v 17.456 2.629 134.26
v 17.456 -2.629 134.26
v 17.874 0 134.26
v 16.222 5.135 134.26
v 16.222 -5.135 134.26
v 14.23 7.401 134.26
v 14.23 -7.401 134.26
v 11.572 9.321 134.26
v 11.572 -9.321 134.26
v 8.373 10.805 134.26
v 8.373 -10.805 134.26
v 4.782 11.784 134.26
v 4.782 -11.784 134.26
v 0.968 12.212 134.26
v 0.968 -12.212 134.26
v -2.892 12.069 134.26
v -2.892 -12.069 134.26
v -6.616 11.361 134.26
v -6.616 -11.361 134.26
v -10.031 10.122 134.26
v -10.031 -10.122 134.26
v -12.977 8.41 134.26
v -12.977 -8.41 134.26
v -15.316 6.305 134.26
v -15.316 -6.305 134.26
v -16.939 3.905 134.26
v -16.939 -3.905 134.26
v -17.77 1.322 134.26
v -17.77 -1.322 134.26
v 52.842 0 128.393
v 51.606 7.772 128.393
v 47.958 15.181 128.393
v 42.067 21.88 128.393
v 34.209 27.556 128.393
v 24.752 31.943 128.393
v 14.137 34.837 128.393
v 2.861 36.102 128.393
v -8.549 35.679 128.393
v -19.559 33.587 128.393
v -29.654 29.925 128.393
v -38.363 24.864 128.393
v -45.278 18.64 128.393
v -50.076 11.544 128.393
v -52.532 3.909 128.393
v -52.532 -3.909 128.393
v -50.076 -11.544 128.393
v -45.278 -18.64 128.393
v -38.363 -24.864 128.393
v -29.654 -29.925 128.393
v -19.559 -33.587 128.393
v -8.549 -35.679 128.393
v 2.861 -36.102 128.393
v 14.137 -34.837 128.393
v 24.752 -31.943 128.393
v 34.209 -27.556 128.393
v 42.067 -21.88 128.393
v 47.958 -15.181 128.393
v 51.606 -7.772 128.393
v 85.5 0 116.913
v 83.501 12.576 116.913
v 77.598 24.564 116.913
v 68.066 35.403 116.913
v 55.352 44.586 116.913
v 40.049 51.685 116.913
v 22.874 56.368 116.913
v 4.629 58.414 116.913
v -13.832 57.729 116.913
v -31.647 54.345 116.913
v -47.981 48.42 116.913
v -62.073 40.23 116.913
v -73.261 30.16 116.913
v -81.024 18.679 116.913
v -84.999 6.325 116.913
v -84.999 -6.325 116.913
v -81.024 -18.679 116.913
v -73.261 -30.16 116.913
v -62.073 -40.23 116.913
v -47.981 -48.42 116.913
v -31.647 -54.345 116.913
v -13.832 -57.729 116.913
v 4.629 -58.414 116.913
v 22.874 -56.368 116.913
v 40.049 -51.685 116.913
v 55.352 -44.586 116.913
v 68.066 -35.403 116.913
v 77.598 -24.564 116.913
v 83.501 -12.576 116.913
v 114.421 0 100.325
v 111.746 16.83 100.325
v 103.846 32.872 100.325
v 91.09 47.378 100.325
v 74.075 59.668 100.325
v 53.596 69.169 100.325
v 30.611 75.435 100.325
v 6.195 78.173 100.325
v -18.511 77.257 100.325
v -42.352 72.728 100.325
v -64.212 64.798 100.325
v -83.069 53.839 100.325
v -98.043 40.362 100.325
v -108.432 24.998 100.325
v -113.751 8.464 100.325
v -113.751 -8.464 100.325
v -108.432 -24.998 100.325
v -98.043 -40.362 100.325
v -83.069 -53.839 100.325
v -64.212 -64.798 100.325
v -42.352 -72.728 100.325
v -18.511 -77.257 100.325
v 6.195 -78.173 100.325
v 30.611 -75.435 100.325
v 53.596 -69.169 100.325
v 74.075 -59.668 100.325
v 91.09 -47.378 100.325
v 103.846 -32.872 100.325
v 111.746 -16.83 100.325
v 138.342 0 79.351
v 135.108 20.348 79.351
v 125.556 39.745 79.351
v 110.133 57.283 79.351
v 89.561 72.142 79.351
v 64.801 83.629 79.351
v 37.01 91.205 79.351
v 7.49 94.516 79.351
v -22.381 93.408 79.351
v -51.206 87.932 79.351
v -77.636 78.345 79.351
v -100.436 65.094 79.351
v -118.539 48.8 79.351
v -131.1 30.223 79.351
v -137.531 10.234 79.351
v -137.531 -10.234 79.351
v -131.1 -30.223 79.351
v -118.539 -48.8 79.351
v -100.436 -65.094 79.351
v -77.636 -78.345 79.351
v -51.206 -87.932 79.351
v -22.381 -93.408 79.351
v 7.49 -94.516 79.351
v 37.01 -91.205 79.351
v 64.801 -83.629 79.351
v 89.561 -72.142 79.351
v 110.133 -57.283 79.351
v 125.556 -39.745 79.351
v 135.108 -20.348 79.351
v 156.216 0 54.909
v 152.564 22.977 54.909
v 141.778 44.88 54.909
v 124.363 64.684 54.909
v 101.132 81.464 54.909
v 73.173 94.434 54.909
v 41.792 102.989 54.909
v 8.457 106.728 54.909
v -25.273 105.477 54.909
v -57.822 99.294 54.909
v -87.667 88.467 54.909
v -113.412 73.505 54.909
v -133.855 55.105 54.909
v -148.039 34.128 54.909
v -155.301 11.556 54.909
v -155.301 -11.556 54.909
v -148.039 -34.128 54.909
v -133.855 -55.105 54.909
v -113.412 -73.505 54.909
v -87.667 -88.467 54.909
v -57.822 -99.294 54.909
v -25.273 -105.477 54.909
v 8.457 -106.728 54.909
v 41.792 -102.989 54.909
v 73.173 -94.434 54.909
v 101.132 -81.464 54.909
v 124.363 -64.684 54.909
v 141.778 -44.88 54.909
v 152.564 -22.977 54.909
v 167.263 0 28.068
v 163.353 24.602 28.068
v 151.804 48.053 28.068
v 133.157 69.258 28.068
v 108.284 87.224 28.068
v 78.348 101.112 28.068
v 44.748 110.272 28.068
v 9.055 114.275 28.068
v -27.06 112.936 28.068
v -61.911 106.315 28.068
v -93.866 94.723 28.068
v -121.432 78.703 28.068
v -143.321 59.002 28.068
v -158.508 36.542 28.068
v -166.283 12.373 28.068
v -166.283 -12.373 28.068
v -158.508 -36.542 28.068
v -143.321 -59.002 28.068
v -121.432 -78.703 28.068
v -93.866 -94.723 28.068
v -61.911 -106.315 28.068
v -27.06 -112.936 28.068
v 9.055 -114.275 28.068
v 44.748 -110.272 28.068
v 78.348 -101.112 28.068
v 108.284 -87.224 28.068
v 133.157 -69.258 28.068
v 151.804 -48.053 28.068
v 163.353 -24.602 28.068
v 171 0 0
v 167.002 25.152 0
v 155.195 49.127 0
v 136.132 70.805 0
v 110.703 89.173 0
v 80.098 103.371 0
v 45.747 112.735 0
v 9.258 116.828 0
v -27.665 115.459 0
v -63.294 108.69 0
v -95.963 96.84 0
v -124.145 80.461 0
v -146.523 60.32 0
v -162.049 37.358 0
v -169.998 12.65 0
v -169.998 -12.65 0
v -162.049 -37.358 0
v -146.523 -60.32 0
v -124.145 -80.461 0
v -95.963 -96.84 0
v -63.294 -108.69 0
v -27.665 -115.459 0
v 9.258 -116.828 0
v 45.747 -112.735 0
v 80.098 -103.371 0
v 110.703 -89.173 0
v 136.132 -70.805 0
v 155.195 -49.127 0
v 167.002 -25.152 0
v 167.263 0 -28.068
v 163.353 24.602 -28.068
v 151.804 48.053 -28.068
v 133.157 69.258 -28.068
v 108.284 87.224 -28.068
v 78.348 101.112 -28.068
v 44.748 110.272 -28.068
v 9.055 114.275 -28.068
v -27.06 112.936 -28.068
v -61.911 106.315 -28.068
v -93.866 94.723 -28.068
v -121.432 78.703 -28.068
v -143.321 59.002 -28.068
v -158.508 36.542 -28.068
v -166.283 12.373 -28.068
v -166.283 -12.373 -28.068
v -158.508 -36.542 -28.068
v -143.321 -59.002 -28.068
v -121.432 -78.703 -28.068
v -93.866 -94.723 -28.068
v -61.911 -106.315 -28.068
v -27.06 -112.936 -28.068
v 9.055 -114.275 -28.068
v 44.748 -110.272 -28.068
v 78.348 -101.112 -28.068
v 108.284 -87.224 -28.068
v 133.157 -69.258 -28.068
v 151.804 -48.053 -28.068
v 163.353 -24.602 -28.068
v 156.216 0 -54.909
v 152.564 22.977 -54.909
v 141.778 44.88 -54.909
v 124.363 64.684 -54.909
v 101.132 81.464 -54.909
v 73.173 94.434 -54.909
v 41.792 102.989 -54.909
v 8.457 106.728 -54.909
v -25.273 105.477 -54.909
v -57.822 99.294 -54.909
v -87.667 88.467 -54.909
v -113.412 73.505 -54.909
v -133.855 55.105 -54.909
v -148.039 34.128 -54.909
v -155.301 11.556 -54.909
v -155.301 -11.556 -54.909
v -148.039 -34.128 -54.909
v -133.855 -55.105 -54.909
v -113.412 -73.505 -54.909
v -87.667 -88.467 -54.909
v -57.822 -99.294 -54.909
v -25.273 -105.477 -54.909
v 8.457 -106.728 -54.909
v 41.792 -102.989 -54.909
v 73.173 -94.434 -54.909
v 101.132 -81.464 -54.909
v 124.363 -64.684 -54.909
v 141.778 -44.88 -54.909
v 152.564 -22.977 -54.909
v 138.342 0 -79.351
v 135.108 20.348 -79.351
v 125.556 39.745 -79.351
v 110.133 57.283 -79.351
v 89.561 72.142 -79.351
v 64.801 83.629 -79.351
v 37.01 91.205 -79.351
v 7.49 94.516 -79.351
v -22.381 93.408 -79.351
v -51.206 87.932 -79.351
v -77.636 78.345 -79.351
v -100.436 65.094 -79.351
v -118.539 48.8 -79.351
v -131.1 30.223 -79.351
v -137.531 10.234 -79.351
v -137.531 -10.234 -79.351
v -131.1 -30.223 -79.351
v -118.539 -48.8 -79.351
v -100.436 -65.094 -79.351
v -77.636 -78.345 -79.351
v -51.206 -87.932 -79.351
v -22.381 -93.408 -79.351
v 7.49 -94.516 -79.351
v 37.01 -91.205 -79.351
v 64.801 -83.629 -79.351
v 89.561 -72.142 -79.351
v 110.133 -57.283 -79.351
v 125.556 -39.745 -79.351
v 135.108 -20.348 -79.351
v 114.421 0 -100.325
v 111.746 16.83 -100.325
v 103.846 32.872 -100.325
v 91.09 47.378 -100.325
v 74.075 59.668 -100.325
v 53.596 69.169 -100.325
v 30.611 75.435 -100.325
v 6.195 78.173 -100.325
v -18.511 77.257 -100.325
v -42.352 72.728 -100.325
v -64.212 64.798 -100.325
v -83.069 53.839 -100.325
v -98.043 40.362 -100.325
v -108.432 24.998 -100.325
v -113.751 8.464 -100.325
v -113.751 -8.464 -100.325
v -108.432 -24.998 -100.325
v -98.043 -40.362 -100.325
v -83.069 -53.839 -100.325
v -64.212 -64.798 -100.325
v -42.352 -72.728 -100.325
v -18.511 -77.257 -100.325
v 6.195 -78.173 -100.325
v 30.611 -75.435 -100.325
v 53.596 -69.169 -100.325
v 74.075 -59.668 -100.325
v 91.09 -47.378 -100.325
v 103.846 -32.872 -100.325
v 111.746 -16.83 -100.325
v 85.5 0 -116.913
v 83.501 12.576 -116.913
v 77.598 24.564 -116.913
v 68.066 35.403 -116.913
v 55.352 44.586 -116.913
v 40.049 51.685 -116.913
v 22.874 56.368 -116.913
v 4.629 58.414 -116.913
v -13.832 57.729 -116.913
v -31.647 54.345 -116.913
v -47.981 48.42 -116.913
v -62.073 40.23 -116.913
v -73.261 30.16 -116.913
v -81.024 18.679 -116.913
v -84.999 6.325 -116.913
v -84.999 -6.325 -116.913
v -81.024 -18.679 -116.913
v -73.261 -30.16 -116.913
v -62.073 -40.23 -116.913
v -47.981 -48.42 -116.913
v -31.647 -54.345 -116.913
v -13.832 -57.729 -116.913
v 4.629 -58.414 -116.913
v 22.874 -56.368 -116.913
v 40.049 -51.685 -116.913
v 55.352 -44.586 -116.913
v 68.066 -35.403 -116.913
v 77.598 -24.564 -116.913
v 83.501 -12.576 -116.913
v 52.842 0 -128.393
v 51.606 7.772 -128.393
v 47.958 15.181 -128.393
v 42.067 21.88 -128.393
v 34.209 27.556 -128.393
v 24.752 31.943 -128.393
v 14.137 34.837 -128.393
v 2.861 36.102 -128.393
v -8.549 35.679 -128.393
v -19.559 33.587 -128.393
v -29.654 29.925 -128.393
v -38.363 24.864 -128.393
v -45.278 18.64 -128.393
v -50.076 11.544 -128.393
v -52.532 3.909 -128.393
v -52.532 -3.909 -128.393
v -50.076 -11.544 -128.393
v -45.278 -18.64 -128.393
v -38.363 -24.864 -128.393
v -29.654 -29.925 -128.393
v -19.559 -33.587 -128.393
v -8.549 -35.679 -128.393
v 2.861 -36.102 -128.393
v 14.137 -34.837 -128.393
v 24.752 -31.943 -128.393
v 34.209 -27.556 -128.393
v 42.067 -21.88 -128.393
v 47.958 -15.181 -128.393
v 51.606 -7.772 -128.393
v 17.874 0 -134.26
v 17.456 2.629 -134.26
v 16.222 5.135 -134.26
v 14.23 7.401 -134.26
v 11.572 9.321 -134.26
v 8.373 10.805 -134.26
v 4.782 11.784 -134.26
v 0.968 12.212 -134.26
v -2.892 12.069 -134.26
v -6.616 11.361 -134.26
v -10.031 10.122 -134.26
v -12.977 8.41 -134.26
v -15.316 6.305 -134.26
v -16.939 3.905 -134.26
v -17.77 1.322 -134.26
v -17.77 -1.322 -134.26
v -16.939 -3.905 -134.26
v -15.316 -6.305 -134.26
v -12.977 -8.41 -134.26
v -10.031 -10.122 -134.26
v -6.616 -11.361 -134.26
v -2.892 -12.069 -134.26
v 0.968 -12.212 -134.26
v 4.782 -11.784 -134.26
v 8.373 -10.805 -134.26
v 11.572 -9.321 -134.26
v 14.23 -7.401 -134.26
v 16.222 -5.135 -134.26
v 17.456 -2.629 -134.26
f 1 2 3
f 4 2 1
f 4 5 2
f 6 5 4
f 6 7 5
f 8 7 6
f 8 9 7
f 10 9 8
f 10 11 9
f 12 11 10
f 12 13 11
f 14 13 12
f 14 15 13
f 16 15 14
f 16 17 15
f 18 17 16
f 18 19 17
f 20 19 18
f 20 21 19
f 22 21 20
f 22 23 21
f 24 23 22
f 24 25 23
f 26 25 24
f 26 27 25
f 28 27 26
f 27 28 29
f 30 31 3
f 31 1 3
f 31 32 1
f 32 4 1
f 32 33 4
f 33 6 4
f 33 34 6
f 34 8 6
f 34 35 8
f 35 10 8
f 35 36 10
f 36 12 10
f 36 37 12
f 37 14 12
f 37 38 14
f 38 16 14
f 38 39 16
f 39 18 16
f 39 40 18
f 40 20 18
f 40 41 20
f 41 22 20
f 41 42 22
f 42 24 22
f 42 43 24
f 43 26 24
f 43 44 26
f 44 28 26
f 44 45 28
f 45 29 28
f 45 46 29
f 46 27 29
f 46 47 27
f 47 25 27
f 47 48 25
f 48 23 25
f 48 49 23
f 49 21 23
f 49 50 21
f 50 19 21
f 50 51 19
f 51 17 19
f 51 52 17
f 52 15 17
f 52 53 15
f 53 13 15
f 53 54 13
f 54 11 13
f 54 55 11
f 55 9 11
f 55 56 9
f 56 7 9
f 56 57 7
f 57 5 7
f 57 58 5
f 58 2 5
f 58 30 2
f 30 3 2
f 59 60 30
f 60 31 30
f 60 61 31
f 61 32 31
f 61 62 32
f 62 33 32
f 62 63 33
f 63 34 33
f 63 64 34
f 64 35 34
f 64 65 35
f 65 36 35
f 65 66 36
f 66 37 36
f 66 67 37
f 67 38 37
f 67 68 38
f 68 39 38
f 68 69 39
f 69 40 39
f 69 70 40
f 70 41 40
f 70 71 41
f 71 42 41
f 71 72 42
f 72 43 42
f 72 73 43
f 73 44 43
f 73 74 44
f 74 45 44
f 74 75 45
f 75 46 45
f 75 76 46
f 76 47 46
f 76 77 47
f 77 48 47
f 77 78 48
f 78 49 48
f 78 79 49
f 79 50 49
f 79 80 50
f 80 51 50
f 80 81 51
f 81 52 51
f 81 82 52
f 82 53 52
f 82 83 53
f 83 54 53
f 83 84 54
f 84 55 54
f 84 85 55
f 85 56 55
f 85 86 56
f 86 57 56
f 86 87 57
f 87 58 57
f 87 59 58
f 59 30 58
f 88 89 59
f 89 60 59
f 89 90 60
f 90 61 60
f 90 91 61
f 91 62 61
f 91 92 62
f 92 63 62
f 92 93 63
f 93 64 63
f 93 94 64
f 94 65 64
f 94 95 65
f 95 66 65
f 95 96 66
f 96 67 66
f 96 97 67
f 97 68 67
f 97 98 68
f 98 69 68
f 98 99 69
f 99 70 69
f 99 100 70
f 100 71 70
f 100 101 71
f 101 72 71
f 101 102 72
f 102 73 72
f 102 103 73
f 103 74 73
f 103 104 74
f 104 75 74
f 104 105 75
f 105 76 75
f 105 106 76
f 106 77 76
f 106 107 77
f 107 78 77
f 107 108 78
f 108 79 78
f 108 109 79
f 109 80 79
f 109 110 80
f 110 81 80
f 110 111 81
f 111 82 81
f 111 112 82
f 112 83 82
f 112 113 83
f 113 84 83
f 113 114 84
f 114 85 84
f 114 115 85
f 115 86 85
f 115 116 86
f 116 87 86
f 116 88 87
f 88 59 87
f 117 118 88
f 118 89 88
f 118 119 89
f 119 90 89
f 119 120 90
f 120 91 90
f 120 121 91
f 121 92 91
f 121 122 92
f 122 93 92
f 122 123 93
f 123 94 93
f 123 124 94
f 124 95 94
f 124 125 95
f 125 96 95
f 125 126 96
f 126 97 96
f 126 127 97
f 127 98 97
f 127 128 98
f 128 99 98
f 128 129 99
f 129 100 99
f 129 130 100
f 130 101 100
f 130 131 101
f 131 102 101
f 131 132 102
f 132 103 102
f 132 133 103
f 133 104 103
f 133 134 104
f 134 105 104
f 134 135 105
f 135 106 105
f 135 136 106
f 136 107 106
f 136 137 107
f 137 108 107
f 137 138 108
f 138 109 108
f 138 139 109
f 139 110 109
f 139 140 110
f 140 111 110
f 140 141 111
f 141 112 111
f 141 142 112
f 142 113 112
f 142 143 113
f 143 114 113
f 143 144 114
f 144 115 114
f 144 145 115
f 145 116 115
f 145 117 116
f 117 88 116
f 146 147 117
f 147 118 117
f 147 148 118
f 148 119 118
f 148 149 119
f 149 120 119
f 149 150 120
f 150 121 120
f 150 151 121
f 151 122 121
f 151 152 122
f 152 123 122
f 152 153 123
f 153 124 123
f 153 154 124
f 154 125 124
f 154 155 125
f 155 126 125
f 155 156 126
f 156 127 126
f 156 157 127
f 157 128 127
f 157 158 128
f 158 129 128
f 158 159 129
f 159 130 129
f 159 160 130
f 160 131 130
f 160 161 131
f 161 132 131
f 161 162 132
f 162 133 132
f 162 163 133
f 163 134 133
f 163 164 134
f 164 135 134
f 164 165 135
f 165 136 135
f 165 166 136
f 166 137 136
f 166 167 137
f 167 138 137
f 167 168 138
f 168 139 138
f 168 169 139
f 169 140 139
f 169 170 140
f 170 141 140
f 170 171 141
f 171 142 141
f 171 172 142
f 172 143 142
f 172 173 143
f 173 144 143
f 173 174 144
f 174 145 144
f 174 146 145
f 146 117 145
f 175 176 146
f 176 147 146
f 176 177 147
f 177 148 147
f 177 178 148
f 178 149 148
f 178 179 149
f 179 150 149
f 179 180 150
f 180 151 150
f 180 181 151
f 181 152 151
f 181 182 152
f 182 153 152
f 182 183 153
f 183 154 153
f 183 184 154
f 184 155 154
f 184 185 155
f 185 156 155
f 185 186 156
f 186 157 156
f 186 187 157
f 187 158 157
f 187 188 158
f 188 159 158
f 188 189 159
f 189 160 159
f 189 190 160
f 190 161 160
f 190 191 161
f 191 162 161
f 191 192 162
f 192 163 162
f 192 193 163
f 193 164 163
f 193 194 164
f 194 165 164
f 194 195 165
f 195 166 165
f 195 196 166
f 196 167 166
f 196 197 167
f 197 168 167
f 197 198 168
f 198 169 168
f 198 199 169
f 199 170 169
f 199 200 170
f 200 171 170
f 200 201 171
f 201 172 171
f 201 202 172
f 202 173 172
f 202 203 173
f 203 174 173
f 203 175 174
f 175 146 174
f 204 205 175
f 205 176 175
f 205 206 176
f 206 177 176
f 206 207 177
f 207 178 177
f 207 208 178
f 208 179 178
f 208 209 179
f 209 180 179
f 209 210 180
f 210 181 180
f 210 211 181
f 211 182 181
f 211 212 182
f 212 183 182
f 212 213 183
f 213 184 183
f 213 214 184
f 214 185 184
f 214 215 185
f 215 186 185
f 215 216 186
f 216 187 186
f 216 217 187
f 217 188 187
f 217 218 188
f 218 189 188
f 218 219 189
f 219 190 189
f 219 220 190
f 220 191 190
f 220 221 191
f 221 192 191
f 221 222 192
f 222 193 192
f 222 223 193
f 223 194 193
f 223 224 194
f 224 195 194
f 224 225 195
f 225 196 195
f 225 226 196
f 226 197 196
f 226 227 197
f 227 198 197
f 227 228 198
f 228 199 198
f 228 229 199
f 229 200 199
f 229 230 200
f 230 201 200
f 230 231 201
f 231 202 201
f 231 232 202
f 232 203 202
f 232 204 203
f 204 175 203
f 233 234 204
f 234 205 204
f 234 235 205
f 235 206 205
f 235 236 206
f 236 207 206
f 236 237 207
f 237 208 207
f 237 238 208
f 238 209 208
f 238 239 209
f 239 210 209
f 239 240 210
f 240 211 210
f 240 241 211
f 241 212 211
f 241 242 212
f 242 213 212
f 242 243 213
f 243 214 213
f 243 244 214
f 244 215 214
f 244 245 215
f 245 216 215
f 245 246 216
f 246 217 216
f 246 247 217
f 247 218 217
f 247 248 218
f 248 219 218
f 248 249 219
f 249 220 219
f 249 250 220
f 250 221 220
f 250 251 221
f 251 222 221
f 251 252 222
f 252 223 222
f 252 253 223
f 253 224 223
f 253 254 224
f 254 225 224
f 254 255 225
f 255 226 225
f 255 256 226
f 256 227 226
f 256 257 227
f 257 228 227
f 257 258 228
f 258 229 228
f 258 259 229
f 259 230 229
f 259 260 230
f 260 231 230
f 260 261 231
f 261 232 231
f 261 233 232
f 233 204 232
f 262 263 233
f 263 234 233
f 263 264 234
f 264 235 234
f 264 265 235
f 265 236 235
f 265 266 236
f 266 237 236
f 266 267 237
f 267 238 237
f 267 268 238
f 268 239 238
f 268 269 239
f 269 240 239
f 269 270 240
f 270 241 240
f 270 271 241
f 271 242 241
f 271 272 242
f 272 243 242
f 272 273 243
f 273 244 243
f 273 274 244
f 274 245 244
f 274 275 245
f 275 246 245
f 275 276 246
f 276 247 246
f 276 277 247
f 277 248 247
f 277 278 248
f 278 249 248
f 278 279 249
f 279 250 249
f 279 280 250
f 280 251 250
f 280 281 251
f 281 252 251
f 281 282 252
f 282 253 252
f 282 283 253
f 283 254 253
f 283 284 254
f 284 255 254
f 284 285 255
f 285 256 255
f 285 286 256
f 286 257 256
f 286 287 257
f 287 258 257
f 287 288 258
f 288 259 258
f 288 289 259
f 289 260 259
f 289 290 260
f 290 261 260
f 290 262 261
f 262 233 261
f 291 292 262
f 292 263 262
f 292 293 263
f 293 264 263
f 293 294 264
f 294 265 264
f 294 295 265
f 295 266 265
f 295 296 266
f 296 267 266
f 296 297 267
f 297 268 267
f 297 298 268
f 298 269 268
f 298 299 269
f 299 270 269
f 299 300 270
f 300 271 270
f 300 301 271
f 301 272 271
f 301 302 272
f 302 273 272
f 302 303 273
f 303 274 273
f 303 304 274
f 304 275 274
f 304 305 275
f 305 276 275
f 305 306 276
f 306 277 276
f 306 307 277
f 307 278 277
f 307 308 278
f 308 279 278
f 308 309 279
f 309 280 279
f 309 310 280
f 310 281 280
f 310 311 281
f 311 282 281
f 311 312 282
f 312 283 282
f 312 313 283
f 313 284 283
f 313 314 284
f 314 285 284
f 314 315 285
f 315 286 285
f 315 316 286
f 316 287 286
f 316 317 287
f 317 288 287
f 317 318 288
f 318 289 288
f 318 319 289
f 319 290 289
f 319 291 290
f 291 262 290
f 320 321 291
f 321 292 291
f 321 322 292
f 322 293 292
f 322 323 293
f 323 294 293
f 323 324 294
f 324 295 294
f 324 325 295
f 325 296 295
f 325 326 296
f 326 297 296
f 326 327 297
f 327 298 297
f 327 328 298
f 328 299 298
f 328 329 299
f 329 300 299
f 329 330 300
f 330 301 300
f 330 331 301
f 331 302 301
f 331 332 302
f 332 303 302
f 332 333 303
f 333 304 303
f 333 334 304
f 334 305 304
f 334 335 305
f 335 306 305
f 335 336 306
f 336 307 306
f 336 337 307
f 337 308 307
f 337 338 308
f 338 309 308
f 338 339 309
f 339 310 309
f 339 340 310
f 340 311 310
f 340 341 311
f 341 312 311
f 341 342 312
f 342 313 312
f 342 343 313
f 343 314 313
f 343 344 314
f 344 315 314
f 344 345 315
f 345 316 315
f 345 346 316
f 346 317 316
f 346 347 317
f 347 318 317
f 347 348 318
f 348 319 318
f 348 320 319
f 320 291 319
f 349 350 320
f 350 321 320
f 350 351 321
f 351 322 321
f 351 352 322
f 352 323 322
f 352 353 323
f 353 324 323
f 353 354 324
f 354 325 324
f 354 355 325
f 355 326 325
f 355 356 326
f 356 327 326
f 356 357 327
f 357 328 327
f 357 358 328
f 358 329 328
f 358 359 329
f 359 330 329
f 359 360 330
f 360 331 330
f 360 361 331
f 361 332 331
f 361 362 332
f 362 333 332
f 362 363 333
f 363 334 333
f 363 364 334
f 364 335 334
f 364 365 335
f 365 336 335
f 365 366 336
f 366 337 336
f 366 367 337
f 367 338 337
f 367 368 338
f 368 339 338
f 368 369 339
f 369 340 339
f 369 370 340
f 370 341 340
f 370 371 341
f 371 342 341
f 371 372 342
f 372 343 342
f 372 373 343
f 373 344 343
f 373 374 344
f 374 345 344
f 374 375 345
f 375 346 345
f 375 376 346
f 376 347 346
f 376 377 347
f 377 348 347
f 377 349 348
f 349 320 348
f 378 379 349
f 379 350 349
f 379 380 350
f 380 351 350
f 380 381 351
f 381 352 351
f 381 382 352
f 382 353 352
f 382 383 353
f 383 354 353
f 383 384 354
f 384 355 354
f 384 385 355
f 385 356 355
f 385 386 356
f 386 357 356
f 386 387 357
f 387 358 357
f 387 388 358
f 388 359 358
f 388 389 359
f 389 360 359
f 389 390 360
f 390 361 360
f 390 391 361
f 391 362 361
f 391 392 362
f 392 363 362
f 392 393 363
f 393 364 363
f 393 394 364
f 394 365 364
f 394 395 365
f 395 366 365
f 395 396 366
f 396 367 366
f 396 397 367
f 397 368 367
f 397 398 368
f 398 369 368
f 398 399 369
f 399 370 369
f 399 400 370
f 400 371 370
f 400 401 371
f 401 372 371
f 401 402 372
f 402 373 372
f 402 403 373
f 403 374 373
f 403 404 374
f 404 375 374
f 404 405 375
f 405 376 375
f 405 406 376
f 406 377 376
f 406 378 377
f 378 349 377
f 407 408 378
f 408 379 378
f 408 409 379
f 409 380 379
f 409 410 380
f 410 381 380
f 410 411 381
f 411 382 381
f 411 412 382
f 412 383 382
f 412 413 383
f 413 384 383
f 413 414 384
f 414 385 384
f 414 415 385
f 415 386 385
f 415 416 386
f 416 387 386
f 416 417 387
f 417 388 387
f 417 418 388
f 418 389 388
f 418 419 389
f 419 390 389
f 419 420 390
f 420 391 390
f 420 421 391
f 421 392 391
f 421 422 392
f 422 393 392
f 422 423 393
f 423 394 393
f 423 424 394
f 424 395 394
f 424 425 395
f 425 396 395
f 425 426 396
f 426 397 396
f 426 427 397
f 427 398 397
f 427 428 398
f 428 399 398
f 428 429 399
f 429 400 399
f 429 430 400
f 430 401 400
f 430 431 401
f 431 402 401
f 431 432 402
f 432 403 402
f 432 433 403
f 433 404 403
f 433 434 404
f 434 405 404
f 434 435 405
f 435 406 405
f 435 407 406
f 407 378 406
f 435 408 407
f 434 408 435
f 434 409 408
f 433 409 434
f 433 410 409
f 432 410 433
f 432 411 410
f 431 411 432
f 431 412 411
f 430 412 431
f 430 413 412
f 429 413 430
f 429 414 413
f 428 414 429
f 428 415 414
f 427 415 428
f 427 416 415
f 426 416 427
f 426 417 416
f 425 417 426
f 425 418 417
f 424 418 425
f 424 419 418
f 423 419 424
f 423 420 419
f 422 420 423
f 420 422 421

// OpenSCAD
// Generated by SolidPython 1.0.1 on 2020-07-29 00:46:54


scale(v = [19, 13, 15]) {
	sphere(r = 9);
}
/***********************************************
*********      SolidPython code:      **********
************************************************
 
# import packages: SolidPython
from solid import *
from solid.utils import *
from itertools import chain, combinations, permutations


class Resize:

    def __init__(self, scad_file):
        self.scad_file = scad_file
        #self.scad_file = import_scad(scad_file)
        # cone/cylinder param:
        self.r1 = 0
        self.r2 = 0
        self.h = 0
        # rectangular prism param:
        self.w = 0
        self.l = 0
        # ellipse param:
        self.r = 0

    # import OpenScad code (file name corresponds to shape)


    # classify shape + parameters
    def assign(self, param1, param2, param3):
        if self.scad_file == 'cone.scad':
            self.r1 = param1
            self.r2 = param2
            self.h = param3
        elif self.scad_file == 'cylinder.scad':
            self.r1 = param1
            self.r2 = param2
            self.h = param3
        elif self.scad_file == 'rectangularPrism.scad':
            self.h = param1
            self.l = param2
            self.w = param3
        else:
            self.r = param1
            self.h = param2

    # resize parameters
    def iterate(self):
        x = range(3, 20, 2)
        i = 1
        if self.scad_file == 'cone.scad':
            tempList = list(permutations(x, 2))
            for temp in tempList:
                param1 = temp[0]
                param2 = temp[1]
                filepath = 'produced_scad_files/' + 'cone' + str(param1) + '_' + str(param2) + '_' + '.scad'
                scad_render_to_file(cylinder(h=param1, r1=param2, r2=0), filepath)

        elif self.scad_file == 'cylinder.scad':
            tempList = list(permutations(x, 3))
            for temp in tempList:
                param1 = temp[0]
                param2 = temp[1]
                filepath = 'produced_scad_files/' + 'cylinder' + str(param1) + '_' + str(param2) + '_' + '.scad'
                scad_render_to_file(cylinder(h=param1, r1=param2, r2=param2), filepath)

        elif self.scad_file == 'rectangularPrism.scad':
            tempList = list(permutations(x, 3))
            for temp in tempList:
                param1 = temp[0]
                param2 = temp[1]
                param3 = temp[2]
                filepath = 'produced_scad_files/' + 'rectangularPrism' + str(param1) + '_' + str(param2) + '_' + str(
                    param3) + '.scad'
                scad_render_to_file(cube(size=(param1, param2, param3)), filepath)

        elif self.scad_file == 'ellipse.scad':
            tempList = list(permutations(x, 4))
            for temp in tempList:
                param1 = temp[0]
                param2 = temp[1]
                param3 = temp[2]
                param4 = temp[3]
                filepath = 'produced_scad_files/' + 'ellipse' + str(param1) + '_' + str(param2) + '_' + str(param3) + '_' + str(param4) + '.scad'
                scad_render_to_file(scale([param1, param2, param3])(sphere(r=param4)), filepath)

    def render_to_scadfile(self):
        scad_render_to_file(scad, 'example.scad') 
 
************************************************/
